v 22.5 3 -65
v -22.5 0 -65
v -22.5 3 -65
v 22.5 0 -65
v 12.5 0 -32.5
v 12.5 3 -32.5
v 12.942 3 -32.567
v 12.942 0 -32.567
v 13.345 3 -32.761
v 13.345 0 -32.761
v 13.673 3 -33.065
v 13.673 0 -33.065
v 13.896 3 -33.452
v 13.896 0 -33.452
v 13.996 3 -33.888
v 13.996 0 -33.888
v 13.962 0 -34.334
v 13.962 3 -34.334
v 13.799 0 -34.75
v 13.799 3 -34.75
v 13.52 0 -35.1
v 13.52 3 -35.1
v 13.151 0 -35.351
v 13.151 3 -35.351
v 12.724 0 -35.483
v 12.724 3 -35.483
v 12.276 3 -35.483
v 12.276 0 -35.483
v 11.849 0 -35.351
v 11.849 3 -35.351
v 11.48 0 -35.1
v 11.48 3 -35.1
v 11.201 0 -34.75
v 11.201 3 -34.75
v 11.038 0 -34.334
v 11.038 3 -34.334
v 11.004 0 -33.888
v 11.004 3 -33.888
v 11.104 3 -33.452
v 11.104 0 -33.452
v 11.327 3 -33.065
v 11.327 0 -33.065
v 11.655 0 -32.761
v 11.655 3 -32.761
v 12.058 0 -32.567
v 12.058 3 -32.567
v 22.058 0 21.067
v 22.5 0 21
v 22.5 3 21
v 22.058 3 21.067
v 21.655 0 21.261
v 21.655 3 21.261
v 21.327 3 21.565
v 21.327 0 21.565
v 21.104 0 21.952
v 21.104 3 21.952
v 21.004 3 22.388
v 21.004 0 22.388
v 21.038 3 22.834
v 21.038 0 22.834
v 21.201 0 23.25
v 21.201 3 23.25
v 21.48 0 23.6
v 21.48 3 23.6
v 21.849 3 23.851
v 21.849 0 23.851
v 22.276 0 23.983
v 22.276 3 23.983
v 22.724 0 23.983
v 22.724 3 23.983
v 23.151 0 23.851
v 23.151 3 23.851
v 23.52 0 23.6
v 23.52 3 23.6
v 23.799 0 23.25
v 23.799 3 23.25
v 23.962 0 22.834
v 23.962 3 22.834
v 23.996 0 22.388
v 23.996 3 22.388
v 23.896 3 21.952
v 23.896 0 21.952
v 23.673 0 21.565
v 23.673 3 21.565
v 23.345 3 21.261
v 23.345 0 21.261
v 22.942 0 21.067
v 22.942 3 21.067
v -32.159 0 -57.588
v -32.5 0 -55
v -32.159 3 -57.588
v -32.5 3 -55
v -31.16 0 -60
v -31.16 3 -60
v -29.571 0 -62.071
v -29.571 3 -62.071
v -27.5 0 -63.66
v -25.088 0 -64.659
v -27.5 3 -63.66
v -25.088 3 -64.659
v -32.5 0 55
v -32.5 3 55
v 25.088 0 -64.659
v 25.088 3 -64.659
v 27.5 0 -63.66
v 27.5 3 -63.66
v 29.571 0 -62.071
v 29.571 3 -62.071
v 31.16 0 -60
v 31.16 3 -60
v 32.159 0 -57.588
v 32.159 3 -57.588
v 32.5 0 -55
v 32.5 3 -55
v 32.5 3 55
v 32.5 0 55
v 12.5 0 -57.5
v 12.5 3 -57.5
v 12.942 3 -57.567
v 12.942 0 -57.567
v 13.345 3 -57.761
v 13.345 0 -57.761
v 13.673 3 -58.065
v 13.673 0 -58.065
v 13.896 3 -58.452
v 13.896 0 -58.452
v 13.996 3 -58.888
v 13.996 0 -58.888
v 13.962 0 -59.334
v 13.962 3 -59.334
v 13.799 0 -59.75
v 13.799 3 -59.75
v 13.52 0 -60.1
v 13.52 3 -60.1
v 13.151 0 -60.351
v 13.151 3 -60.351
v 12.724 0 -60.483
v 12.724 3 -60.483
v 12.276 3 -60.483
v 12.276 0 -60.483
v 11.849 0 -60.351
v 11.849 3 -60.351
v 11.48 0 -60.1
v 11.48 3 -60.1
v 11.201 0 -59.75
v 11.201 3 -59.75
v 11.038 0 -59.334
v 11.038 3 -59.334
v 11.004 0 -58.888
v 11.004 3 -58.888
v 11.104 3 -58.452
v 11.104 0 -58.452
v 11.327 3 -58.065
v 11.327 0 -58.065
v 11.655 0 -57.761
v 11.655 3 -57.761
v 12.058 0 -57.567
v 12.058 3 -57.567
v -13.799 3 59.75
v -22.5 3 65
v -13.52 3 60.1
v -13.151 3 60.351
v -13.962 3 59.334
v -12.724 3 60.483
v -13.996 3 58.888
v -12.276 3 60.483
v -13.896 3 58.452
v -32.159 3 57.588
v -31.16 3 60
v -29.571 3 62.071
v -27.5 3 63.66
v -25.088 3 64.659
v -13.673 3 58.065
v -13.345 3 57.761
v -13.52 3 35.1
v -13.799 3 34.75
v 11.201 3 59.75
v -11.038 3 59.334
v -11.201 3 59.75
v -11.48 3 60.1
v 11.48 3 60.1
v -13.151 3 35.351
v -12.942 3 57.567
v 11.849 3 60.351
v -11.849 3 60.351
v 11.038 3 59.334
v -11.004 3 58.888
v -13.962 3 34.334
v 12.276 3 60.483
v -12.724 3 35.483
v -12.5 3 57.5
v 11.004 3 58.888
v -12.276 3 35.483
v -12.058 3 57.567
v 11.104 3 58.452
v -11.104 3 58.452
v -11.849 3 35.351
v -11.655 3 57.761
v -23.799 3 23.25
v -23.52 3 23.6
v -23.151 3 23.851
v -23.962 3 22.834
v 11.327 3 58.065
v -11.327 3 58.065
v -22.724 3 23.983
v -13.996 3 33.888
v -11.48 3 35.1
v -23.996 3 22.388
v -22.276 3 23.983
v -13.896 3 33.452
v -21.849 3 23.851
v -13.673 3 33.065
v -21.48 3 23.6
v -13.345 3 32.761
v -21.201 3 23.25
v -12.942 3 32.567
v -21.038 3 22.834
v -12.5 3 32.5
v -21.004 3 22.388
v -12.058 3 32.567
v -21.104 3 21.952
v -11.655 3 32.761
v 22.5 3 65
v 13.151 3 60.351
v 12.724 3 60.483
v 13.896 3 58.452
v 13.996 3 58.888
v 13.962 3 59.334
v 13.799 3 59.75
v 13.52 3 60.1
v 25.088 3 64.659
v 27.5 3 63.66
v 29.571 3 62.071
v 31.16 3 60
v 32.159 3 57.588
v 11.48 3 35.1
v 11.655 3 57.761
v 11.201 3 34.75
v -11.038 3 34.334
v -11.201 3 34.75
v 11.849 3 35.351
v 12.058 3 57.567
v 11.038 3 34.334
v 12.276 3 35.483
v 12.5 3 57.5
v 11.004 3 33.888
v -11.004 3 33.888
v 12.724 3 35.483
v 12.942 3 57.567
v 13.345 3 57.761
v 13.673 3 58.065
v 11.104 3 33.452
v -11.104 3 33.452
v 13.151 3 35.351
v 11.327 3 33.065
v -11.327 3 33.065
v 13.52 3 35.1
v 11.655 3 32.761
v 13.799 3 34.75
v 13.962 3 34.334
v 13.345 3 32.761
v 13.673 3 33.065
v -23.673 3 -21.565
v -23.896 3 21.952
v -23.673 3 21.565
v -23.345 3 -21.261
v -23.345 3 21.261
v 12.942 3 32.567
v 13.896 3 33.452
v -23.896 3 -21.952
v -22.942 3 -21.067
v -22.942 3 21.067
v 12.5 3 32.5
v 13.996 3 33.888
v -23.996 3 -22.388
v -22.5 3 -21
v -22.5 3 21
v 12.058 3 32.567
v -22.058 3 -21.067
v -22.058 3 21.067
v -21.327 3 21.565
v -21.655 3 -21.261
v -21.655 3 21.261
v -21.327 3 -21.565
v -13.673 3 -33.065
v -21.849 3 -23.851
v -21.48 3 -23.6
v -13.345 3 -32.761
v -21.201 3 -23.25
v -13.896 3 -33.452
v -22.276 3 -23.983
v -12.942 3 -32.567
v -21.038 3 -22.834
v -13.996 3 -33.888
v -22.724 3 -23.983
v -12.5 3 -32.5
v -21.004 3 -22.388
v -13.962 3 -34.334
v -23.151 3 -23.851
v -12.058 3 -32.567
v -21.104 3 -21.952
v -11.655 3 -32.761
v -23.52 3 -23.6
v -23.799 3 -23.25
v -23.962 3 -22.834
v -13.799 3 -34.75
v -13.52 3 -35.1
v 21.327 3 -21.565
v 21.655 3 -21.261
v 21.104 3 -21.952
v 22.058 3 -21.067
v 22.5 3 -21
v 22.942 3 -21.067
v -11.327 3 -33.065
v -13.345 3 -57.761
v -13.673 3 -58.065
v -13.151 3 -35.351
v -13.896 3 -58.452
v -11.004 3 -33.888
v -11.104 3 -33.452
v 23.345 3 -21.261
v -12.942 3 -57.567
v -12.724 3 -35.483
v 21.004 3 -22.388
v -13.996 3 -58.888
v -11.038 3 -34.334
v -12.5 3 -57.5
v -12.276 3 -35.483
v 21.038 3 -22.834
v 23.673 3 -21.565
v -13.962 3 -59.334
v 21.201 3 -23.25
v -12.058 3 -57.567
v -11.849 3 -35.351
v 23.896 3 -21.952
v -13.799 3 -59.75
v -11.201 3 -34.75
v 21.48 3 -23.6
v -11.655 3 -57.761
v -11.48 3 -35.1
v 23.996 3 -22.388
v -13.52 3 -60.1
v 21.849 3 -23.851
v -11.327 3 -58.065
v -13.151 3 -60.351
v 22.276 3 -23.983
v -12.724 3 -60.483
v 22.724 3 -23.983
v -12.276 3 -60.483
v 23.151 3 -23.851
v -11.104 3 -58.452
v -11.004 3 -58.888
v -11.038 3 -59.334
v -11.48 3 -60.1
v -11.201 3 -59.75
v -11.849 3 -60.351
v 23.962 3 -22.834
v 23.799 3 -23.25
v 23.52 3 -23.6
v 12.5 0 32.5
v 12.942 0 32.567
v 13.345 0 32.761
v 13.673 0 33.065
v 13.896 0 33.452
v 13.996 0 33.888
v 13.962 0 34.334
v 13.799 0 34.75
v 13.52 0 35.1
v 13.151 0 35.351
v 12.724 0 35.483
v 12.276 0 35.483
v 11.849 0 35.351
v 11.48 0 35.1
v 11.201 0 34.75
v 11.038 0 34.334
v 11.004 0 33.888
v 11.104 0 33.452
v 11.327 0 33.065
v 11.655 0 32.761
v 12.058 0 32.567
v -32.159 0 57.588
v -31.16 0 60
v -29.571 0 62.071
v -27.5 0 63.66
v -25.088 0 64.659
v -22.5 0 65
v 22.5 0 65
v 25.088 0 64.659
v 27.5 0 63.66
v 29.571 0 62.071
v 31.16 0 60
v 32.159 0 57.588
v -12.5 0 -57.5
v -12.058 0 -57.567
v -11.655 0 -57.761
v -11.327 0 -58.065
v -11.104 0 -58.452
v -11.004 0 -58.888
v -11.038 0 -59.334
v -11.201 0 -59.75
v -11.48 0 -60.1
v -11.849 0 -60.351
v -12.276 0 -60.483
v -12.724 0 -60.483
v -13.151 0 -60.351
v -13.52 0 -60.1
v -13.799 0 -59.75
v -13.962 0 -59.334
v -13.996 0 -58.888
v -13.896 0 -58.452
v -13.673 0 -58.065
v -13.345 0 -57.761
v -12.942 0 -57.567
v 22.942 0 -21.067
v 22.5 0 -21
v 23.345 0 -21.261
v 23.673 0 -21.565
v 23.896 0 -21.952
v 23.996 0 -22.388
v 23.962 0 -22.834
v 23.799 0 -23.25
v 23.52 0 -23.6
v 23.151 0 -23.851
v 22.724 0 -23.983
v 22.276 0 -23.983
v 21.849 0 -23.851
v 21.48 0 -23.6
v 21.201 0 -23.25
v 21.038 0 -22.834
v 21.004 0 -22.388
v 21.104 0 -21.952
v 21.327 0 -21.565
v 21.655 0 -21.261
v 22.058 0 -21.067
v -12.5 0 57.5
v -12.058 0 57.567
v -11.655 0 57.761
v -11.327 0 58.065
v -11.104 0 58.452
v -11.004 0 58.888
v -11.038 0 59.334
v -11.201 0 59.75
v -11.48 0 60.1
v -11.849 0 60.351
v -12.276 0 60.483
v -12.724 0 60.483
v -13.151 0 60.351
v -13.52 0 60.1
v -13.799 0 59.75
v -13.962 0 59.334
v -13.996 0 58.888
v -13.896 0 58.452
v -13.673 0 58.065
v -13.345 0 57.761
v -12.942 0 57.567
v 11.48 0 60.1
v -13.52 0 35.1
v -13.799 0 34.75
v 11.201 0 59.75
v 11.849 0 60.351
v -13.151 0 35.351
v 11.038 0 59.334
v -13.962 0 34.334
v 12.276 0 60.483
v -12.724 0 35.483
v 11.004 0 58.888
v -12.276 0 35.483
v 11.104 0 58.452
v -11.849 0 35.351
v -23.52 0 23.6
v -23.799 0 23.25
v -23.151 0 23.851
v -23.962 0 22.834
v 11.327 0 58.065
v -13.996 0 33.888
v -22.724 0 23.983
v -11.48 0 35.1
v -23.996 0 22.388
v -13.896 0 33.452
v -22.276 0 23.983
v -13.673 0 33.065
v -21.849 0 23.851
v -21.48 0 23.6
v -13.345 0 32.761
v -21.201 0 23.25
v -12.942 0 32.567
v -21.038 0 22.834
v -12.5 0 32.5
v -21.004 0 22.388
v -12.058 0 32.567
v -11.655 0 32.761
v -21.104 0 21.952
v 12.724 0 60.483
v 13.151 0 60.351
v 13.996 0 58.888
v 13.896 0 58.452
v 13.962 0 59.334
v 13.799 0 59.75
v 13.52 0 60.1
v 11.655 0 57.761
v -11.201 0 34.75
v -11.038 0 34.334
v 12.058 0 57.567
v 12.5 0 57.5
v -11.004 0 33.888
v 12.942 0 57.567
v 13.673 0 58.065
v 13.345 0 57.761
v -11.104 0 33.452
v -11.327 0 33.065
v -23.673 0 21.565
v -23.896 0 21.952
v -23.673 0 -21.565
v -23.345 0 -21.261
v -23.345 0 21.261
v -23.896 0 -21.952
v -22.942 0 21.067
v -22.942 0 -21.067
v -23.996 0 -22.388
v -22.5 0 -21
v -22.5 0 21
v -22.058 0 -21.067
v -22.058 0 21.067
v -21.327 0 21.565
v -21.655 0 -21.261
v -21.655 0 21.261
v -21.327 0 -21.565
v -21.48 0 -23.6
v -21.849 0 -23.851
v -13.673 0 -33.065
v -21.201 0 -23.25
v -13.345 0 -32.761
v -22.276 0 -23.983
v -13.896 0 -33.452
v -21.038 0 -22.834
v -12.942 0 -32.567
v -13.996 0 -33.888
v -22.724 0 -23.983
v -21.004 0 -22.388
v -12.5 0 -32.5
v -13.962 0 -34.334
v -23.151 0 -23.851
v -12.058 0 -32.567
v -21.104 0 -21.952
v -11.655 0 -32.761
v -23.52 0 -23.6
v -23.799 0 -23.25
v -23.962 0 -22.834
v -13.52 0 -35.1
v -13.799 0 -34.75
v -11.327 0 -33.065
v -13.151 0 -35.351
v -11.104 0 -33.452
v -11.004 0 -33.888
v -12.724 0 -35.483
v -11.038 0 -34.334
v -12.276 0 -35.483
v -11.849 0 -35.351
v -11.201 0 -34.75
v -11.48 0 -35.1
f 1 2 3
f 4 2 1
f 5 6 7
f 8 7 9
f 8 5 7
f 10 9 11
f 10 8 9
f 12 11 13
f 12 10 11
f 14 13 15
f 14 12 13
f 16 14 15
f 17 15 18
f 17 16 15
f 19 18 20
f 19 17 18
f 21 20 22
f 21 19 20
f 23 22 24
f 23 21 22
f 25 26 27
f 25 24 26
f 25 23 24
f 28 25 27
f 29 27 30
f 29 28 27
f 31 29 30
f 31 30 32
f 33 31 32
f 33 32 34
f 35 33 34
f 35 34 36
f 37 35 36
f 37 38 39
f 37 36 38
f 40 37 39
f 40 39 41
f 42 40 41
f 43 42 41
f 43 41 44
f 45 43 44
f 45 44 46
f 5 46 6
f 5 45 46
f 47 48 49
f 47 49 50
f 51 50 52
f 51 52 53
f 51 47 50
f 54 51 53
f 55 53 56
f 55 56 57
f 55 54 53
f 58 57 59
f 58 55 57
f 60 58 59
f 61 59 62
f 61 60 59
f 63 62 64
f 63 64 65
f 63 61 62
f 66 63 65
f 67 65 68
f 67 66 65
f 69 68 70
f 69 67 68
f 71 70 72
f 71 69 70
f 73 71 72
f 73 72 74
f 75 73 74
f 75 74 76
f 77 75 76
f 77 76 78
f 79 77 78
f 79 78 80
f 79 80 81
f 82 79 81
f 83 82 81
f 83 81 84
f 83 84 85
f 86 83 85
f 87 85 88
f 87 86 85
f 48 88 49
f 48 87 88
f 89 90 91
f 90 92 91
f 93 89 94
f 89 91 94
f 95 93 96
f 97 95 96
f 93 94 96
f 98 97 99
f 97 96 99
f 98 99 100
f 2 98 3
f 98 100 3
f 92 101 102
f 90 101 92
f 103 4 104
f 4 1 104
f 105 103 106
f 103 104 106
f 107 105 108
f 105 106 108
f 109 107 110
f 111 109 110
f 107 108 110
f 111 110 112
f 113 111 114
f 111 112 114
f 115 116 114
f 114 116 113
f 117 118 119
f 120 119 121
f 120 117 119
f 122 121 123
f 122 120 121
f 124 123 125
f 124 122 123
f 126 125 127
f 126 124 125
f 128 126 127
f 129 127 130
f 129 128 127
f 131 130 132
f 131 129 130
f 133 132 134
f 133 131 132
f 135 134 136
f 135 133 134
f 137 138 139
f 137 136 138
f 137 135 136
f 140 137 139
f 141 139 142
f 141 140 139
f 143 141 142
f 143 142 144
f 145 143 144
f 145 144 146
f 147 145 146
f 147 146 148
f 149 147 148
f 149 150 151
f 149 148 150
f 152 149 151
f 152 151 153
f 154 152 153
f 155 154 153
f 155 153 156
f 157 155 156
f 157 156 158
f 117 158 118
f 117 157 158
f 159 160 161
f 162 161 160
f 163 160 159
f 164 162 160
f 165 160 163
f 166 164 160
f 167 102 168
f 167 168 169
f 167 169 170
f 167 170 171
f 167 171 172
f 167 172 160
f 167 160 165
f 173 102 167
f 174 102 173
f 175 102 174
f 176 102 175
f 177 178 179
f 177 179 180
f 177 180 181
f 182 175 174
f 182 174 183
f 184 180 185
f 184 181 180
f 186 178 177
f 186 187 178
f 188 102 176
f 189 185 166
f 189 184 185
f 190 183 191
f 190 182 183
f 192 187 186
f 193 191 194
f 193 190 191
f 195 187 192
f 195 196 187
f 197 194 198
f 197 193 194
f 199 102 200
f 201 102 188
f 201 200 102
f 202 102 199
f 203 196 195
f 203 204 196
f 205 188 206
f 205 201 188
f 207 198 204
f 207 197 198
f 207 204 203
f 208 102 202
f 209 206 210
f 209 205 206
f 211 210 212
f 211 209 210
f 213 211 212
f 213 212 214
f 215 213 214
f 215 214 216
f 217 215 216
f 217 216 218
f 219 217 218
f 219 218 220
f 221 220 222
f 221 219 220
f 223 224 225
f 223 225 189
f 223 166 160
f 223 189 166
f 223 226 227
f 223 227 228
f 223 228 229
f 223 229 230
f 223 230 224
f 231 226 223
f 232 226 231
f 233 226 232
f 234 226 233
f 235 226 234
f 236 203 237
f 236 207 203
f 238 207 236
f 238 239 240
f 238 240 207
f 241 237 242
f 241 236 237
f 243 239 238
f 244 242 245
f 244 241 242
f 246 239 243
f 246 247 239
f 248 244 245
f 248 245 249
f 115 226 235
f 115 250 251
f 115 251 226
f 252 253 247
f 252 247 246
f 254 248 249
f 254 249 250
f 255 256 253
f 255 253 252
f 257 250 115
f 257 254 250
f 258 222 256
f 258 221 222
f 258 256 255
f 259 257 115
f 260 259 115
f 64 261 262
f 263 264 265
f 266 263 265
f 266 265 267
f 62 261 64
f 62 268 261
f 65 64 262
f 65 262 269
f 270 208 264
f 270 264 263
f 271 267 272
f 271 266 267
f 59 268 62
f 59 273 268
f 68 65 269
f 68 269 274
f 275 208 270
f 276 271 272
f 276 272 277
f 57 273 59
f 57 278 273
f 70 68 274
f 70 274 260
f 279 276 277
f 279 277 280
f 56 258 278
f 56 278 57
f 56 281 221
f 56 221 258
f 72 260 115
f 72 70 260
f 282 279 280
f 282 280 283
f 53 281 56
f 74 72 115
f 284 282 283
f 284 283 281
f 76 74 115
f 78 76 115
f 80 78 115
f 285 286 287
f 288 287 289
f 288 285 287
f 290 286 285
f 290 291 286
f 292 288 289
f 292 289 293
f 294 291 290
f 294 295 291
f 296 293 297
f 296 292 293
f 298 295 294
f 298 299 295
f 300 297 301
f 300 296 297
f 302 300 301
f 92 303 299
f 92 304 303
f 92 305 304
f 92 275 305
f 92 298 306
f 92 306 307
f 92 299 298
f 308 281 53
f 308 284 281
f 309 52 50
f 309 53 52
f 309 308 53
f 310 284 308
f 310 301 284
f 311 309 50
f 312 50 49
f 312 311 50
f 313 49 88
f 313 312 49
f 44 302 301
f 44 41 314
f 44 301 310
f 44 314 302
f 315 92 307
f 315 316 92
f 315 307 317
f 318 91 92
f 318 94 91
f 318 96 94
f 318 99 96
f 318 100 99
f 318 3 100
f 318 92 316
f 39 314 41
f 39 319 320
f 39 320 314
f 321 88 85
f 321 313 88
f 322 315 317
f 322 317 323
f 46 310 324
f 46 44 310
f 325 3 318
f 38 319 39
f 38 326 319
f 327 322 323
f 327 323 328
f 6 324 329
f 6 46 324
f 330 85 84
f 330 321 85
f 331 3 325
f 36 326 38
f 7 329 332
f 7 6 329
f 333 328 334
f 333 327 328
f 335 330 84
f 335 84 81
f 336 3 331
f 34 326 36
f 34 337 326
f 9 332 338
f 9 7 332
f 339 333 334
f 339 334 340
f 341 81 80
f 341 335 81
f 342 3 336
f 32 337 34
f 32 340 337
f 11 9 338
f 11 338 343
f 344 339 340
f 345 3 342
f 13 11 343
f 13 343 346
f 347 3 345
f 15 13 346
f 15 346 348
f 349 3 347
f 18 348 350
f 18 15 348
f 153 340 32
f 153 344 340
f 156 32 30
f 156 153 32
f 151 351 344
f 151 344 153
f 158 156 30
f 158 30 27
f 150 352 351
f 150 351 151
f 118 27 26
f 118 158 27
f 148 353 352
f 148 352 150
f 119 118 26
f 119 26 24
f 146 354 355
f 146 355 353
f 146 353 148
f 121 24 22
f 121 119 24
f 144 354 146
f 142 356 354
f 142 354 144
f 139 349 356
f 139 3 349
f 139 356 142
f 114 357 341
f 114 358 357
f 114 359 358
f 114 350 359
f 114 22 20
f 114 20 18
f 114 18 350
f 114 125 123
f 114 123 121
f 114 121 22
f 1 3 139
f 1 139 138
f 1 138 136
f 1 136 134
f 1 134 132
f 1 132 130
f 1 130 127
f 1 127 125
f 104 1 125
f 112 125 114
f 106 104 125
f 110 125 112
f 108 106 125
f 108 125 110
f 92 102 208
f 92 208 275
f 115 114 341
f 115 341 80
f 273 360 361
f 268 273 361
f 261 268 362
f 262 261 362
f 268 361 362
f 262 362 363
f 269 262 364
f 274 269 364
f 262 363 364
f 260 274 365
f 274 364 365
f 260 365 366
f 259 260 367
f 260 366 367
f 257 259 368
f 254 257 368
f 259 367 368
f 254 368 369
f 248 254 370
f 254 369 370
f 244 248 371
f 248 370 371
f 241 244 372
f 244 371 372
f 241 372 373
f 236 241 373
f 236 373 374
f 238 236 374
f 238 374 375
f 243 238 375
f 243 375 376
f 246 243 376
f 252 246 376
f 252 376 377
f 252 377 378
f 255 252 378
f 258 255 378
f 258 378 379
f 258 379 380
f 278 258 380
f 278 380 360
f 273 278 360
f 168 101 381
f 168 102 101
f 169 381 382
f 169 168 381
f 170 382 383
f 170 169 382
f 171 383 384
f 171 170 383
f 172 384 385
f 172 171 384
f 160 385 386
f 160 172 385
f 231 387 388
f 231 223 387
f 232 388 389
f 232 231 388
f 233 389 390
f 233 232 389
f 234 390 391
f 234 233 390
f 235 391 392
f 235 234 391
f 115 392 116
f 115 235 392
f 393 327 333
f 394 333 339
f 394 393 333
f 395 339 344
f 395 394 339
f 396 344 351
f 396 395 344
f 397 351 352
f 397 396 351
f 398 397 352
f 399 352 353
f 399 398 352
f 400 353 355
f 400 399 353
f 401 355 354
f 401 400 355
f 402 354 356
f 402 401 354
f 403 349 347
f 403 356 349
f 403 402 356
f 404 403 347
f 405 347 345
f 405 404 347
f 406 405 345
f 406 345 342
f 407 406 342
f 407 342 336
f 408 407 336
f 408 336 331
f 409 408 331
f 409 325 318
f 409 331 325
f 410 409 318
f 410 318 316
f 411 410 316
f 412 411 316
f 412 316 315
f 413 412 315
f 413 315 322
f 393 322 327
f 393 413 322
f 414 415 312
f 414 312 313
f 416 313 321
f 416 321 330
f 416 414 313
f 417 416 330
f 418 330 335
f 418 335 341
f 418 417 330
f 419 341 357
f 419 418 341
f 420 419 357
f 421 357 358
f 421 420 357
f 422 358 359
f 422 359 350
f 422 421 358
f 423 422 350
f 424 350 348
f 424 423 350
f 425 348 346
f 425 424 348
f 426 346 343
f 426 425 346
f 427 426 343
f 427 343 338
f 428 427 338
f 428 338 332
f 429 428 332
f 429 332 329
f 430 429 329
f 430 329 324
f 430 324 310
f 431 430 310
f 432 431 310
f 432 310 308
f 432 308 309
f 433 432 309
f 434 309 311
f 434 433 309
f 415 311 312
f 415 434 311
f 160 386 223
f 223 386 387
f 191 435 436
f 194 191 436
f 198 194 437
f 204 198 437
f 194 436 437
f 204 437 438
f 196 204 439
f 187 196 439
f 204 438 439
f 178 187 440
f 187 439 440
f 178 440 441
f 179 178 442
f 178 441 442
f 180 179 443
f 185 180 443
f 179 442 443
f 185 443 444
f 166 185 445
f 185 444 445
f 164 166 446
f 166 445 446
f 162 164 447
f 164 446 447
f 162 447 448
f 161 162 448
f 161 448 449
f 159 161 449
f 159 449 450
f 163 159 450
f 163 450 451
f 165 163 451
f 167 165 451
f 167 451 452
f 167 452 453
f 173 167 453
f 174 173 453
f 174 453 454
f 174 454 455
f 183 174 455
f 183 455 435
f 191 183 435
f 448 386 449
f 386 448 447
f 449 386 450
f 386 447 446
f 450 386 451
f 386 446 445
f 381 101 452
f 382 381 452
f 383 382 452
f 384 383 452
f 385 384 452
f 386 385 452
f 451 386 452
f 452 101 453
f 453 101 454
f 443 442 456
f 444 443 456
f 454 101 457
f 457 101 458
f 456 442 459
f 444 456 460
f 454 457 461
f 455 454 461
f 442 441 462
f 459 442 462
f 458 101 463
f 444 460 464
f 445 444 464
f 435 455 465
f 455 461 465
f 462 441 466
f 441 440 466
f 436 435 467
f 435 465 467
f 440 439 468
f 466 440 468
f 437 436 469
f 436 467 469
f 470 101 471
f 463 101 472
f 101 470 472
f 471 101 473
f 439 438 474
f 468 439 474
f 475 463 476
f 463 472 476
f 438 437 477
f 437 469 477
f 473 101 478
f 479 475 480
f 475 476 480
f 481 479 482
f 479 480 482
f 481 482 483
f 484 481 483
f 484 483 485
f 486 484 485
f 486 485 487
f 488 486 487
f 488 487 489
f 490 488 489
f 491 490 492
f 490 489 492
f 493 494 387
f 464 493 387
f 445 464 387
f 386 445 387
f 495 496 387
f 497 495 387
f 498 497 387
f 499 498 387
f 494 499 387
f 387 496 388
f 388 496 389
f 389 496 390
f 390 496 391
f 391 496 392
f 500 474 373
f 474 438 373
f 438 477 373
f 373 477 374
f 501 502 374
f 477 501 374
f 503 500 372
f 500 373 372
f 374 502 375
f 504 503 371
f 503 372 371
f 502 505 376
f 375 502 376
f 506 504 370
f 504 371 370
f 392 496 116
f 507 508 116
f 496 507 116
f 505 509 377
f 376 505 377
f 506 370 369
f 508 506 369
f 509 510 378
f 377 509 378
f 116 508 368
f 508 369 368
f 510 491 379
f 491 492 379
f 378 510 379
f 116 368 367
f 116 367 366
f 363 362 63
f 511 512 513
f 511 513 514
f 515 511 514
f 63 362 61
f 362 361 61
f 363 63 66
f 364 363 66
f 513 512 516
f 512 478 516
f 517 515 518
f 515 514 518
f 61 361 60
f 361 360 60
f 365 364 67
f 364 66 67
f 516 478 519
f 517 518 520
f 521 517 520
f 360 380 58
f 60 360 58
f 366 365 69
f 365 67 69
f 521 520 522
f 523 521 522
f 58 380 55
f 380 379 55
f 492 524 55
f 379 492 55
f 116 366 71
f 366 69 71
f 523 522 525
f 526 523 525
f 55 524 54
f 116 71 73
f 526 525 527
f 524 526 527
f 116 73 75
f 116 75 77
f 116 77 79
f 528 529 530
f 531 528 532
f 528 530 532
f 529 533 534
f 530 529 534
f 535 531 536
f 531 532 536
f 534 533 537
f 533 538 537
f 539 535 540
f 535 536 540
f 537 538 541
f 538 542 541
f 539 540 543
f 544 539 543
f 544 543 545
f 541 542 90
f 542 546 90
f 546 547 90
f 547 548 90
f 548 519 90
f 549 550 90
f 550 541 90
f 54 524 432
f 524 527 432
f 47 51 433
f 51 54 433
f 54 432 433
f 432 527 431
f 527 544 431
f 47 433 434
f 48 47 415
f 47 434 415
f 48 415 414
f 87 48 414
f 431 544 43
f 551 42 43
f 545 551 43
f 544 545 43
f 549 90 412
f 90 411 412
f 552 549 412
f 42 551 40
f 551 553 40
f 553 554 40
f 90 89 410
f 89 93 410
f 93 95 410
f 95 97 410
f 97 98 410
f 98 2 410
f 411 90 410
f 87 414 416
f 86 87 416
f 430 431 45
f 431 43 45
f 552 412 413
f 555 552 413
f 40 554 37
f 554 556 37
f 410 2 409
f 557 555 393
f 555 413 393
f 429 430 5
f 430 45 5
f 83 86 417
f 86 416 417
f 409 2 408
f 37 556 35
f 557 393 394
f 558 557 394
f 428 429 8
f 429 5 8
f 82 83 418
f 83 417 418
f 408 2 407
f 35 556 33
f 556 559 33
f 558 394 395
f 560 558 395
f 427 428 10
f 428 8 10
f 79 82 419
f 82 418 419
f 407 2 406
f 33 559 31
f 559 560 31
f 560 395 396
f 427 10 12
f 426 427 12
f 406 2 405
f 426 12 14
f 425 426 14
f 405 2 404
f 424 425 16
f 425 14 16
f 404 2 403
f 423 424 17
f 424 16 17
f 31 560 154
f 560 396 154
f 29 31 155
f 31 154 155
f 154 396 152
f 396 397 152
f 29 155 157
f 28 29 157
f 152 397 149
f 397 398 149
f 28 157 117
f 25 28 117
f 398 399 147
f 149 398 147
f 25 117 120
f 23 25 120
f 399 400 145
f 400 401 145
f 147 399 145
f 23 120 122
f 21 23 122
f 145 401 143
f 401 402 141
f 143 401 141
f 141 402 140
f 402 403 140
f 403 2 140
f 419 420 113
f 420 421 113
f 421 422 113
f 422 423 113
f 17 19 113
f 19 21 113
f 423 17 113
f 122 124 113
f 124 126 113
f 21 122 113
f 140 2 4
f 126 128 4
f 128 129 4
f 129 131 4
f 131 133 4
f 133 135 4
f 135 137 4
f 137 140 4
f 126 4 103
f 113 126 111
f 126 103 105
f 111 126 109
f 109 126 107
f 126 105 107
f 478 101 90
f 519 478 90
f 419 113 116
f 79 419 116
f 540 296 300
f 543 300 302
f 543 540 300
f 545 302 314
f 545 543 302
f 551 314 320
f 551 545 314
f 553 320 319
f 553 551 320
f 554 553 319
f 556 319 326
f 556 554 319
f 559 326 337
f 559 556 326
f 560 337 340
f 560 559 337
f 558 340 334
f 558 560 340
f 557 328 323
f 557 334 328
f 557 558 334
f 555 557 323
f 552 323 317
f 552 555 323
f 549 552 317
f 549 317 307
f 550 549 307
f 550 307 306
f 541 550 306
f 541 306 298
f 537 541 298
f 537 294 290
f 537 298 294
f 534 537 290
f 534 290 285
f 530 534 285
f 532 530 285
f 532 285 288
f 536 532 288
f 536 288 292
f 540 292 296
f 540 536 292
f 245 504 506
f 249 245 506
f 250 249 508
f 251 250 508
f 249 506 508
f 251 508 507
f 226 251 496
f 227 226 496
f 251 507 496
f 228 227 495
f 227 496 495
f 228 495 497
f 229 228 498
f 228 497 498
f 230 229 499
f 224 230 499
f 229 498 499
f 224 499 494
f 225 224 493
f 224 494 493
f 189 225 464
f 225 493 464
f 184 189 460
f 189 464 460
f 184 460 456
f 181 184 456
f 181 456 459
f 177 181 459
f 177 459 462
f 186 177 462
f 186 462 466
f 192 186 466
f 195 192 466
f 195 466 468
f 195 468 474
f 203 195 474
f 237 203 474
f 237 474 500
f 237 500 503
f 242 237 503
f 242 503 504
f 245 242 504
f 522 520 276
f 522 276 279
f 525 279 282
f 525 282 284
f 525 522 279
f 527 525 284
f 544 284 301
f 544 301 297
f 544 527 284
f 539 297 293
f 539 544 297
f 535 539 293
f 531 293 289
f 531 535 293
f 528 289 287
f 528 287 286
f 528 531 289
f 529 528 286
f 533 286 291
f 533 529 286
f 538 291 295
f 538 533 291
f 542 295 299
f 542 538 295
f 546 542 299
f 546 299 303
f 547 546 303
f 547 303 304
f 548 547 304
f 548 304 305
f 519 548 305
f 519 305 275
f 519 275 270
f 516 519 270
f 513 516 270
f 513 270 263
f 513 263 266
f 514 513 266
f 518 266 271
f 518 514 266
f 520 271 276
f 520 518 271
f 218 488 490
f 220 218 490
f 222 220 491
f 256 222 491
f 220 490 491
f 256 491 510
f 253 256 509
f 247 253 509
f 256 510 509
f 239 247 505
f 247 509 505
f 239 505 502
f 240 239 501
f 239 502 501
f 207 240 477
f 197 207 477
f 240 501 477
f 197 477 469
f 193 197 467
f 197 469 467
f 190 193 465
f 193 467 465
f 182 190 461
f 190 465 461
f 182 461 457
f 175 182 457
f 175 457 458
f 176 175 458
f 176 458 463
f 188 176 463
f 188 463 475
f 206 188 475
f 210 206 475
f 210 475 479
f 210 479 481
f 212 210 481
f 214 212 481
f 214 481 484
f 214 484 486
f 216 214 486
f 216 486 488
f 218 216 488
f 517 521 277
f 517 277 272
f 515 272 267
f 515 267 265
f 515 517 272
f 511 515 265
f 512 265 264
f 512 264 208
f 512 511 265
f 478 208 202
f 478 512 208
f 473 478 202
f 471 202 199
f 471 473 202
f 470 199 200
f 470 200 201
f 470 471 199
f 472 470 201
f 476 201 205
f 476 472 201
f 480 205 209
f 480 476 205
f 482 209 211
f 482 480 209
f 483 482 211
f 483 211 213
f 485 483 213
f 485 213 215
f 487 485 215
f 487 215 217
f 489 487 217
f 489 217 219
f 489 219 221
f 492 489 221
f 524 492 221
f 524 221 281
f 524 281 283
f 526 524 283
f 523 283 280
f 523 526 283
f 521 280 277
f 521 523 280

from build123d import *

# Parameters (mm, degrees)
SKETCH1_W           = 65
SKETCH1_H           = 130
SKETCH1_R           = 1.5
BOSS_EXTRUDE1_DEPTH = 3
SKETCH2_R           = 1.5
CUT_EXTRUDE2_DEPTH  = 73.734104793
FILLET1_R           = 10


with BuildPart() as part:
    # Sketch1 → Boss-Extrude1 (new body)
    with BuildSketch(Plane(origin=(0, 0, 0), x_dir=(1, 0, 0), z_dir=(0, 1, 0))):
        Rectangle(SKETCH1_W, SKETCH1_H)
        with Locations(Location((-22.5, 22.5, 0), (0, 0, 270))):
            Circle(SKETCH1_R, mode=Mode.SUBTRACT)
        with Locations(Location((22.5, 22.5, 0), (0, 0, 270))):
            Circle(SKETCH1_R, mode=Mode.SUBTRACT)
        with Locations(Location((-22.5, -22.5, 0), (0, 0, 90))):
            Circle(SKETCH1_R, mode=Mode.SUBTRACT)
        with Locations(Location((22.5, -22.5, 0), (0, 0, 90))):
            Circle(SKETCH1_R, mode=Mode.SUBTRACT)
    extrude(amount=BOSS_EXTRUDE1_DEPTH)

    # Sketch2 → Cut-Extrude2 (cut, through all)
    with BuildSketch(Plane(origin=(0, 0, 0), x_dir=(1, 0, 0), z_dir=(0, 1, 0))):
        with Locations(Location((-12.5, 59, 0), (0, 0, 270))):
            Circle(SKETCH2_R)
        with Locations(Location((12.5, 59, 0), (0, 0, 270))):
            Circle(SKETCH2_R)
        with Locations(Location((12.5, 34, 0), (0, 0, 270))):
            Circle(SKETCH2_R)
        with Locations(Location((-12.5, 34, 0), (0, 0, 270))):
            Circle(SKETCH2_R)
    cut_extrude2 = extrude(amount=CUT_EXTRUDE2_DEPTH, mode=Mode.SUBTRACT)

    # Mirror1: Cut-Extrude2 across plane
    add(cut_extrude2.mirror(Plane.XY), mode=Mode.SUBTRACT)

    # Fillet1
    fillet1_edges = [part.edges().sort_by_distance(p)[0] for p in [
        (32.5, 1.5, -65),
        (32.5, 1.5, 65),
        (-32.5, 1.5, 65),
        (-32.5, 1.5, -65),
    ]]
    fillet(fillet1_edges, radius=FILLET1_R)


solid = part.part
